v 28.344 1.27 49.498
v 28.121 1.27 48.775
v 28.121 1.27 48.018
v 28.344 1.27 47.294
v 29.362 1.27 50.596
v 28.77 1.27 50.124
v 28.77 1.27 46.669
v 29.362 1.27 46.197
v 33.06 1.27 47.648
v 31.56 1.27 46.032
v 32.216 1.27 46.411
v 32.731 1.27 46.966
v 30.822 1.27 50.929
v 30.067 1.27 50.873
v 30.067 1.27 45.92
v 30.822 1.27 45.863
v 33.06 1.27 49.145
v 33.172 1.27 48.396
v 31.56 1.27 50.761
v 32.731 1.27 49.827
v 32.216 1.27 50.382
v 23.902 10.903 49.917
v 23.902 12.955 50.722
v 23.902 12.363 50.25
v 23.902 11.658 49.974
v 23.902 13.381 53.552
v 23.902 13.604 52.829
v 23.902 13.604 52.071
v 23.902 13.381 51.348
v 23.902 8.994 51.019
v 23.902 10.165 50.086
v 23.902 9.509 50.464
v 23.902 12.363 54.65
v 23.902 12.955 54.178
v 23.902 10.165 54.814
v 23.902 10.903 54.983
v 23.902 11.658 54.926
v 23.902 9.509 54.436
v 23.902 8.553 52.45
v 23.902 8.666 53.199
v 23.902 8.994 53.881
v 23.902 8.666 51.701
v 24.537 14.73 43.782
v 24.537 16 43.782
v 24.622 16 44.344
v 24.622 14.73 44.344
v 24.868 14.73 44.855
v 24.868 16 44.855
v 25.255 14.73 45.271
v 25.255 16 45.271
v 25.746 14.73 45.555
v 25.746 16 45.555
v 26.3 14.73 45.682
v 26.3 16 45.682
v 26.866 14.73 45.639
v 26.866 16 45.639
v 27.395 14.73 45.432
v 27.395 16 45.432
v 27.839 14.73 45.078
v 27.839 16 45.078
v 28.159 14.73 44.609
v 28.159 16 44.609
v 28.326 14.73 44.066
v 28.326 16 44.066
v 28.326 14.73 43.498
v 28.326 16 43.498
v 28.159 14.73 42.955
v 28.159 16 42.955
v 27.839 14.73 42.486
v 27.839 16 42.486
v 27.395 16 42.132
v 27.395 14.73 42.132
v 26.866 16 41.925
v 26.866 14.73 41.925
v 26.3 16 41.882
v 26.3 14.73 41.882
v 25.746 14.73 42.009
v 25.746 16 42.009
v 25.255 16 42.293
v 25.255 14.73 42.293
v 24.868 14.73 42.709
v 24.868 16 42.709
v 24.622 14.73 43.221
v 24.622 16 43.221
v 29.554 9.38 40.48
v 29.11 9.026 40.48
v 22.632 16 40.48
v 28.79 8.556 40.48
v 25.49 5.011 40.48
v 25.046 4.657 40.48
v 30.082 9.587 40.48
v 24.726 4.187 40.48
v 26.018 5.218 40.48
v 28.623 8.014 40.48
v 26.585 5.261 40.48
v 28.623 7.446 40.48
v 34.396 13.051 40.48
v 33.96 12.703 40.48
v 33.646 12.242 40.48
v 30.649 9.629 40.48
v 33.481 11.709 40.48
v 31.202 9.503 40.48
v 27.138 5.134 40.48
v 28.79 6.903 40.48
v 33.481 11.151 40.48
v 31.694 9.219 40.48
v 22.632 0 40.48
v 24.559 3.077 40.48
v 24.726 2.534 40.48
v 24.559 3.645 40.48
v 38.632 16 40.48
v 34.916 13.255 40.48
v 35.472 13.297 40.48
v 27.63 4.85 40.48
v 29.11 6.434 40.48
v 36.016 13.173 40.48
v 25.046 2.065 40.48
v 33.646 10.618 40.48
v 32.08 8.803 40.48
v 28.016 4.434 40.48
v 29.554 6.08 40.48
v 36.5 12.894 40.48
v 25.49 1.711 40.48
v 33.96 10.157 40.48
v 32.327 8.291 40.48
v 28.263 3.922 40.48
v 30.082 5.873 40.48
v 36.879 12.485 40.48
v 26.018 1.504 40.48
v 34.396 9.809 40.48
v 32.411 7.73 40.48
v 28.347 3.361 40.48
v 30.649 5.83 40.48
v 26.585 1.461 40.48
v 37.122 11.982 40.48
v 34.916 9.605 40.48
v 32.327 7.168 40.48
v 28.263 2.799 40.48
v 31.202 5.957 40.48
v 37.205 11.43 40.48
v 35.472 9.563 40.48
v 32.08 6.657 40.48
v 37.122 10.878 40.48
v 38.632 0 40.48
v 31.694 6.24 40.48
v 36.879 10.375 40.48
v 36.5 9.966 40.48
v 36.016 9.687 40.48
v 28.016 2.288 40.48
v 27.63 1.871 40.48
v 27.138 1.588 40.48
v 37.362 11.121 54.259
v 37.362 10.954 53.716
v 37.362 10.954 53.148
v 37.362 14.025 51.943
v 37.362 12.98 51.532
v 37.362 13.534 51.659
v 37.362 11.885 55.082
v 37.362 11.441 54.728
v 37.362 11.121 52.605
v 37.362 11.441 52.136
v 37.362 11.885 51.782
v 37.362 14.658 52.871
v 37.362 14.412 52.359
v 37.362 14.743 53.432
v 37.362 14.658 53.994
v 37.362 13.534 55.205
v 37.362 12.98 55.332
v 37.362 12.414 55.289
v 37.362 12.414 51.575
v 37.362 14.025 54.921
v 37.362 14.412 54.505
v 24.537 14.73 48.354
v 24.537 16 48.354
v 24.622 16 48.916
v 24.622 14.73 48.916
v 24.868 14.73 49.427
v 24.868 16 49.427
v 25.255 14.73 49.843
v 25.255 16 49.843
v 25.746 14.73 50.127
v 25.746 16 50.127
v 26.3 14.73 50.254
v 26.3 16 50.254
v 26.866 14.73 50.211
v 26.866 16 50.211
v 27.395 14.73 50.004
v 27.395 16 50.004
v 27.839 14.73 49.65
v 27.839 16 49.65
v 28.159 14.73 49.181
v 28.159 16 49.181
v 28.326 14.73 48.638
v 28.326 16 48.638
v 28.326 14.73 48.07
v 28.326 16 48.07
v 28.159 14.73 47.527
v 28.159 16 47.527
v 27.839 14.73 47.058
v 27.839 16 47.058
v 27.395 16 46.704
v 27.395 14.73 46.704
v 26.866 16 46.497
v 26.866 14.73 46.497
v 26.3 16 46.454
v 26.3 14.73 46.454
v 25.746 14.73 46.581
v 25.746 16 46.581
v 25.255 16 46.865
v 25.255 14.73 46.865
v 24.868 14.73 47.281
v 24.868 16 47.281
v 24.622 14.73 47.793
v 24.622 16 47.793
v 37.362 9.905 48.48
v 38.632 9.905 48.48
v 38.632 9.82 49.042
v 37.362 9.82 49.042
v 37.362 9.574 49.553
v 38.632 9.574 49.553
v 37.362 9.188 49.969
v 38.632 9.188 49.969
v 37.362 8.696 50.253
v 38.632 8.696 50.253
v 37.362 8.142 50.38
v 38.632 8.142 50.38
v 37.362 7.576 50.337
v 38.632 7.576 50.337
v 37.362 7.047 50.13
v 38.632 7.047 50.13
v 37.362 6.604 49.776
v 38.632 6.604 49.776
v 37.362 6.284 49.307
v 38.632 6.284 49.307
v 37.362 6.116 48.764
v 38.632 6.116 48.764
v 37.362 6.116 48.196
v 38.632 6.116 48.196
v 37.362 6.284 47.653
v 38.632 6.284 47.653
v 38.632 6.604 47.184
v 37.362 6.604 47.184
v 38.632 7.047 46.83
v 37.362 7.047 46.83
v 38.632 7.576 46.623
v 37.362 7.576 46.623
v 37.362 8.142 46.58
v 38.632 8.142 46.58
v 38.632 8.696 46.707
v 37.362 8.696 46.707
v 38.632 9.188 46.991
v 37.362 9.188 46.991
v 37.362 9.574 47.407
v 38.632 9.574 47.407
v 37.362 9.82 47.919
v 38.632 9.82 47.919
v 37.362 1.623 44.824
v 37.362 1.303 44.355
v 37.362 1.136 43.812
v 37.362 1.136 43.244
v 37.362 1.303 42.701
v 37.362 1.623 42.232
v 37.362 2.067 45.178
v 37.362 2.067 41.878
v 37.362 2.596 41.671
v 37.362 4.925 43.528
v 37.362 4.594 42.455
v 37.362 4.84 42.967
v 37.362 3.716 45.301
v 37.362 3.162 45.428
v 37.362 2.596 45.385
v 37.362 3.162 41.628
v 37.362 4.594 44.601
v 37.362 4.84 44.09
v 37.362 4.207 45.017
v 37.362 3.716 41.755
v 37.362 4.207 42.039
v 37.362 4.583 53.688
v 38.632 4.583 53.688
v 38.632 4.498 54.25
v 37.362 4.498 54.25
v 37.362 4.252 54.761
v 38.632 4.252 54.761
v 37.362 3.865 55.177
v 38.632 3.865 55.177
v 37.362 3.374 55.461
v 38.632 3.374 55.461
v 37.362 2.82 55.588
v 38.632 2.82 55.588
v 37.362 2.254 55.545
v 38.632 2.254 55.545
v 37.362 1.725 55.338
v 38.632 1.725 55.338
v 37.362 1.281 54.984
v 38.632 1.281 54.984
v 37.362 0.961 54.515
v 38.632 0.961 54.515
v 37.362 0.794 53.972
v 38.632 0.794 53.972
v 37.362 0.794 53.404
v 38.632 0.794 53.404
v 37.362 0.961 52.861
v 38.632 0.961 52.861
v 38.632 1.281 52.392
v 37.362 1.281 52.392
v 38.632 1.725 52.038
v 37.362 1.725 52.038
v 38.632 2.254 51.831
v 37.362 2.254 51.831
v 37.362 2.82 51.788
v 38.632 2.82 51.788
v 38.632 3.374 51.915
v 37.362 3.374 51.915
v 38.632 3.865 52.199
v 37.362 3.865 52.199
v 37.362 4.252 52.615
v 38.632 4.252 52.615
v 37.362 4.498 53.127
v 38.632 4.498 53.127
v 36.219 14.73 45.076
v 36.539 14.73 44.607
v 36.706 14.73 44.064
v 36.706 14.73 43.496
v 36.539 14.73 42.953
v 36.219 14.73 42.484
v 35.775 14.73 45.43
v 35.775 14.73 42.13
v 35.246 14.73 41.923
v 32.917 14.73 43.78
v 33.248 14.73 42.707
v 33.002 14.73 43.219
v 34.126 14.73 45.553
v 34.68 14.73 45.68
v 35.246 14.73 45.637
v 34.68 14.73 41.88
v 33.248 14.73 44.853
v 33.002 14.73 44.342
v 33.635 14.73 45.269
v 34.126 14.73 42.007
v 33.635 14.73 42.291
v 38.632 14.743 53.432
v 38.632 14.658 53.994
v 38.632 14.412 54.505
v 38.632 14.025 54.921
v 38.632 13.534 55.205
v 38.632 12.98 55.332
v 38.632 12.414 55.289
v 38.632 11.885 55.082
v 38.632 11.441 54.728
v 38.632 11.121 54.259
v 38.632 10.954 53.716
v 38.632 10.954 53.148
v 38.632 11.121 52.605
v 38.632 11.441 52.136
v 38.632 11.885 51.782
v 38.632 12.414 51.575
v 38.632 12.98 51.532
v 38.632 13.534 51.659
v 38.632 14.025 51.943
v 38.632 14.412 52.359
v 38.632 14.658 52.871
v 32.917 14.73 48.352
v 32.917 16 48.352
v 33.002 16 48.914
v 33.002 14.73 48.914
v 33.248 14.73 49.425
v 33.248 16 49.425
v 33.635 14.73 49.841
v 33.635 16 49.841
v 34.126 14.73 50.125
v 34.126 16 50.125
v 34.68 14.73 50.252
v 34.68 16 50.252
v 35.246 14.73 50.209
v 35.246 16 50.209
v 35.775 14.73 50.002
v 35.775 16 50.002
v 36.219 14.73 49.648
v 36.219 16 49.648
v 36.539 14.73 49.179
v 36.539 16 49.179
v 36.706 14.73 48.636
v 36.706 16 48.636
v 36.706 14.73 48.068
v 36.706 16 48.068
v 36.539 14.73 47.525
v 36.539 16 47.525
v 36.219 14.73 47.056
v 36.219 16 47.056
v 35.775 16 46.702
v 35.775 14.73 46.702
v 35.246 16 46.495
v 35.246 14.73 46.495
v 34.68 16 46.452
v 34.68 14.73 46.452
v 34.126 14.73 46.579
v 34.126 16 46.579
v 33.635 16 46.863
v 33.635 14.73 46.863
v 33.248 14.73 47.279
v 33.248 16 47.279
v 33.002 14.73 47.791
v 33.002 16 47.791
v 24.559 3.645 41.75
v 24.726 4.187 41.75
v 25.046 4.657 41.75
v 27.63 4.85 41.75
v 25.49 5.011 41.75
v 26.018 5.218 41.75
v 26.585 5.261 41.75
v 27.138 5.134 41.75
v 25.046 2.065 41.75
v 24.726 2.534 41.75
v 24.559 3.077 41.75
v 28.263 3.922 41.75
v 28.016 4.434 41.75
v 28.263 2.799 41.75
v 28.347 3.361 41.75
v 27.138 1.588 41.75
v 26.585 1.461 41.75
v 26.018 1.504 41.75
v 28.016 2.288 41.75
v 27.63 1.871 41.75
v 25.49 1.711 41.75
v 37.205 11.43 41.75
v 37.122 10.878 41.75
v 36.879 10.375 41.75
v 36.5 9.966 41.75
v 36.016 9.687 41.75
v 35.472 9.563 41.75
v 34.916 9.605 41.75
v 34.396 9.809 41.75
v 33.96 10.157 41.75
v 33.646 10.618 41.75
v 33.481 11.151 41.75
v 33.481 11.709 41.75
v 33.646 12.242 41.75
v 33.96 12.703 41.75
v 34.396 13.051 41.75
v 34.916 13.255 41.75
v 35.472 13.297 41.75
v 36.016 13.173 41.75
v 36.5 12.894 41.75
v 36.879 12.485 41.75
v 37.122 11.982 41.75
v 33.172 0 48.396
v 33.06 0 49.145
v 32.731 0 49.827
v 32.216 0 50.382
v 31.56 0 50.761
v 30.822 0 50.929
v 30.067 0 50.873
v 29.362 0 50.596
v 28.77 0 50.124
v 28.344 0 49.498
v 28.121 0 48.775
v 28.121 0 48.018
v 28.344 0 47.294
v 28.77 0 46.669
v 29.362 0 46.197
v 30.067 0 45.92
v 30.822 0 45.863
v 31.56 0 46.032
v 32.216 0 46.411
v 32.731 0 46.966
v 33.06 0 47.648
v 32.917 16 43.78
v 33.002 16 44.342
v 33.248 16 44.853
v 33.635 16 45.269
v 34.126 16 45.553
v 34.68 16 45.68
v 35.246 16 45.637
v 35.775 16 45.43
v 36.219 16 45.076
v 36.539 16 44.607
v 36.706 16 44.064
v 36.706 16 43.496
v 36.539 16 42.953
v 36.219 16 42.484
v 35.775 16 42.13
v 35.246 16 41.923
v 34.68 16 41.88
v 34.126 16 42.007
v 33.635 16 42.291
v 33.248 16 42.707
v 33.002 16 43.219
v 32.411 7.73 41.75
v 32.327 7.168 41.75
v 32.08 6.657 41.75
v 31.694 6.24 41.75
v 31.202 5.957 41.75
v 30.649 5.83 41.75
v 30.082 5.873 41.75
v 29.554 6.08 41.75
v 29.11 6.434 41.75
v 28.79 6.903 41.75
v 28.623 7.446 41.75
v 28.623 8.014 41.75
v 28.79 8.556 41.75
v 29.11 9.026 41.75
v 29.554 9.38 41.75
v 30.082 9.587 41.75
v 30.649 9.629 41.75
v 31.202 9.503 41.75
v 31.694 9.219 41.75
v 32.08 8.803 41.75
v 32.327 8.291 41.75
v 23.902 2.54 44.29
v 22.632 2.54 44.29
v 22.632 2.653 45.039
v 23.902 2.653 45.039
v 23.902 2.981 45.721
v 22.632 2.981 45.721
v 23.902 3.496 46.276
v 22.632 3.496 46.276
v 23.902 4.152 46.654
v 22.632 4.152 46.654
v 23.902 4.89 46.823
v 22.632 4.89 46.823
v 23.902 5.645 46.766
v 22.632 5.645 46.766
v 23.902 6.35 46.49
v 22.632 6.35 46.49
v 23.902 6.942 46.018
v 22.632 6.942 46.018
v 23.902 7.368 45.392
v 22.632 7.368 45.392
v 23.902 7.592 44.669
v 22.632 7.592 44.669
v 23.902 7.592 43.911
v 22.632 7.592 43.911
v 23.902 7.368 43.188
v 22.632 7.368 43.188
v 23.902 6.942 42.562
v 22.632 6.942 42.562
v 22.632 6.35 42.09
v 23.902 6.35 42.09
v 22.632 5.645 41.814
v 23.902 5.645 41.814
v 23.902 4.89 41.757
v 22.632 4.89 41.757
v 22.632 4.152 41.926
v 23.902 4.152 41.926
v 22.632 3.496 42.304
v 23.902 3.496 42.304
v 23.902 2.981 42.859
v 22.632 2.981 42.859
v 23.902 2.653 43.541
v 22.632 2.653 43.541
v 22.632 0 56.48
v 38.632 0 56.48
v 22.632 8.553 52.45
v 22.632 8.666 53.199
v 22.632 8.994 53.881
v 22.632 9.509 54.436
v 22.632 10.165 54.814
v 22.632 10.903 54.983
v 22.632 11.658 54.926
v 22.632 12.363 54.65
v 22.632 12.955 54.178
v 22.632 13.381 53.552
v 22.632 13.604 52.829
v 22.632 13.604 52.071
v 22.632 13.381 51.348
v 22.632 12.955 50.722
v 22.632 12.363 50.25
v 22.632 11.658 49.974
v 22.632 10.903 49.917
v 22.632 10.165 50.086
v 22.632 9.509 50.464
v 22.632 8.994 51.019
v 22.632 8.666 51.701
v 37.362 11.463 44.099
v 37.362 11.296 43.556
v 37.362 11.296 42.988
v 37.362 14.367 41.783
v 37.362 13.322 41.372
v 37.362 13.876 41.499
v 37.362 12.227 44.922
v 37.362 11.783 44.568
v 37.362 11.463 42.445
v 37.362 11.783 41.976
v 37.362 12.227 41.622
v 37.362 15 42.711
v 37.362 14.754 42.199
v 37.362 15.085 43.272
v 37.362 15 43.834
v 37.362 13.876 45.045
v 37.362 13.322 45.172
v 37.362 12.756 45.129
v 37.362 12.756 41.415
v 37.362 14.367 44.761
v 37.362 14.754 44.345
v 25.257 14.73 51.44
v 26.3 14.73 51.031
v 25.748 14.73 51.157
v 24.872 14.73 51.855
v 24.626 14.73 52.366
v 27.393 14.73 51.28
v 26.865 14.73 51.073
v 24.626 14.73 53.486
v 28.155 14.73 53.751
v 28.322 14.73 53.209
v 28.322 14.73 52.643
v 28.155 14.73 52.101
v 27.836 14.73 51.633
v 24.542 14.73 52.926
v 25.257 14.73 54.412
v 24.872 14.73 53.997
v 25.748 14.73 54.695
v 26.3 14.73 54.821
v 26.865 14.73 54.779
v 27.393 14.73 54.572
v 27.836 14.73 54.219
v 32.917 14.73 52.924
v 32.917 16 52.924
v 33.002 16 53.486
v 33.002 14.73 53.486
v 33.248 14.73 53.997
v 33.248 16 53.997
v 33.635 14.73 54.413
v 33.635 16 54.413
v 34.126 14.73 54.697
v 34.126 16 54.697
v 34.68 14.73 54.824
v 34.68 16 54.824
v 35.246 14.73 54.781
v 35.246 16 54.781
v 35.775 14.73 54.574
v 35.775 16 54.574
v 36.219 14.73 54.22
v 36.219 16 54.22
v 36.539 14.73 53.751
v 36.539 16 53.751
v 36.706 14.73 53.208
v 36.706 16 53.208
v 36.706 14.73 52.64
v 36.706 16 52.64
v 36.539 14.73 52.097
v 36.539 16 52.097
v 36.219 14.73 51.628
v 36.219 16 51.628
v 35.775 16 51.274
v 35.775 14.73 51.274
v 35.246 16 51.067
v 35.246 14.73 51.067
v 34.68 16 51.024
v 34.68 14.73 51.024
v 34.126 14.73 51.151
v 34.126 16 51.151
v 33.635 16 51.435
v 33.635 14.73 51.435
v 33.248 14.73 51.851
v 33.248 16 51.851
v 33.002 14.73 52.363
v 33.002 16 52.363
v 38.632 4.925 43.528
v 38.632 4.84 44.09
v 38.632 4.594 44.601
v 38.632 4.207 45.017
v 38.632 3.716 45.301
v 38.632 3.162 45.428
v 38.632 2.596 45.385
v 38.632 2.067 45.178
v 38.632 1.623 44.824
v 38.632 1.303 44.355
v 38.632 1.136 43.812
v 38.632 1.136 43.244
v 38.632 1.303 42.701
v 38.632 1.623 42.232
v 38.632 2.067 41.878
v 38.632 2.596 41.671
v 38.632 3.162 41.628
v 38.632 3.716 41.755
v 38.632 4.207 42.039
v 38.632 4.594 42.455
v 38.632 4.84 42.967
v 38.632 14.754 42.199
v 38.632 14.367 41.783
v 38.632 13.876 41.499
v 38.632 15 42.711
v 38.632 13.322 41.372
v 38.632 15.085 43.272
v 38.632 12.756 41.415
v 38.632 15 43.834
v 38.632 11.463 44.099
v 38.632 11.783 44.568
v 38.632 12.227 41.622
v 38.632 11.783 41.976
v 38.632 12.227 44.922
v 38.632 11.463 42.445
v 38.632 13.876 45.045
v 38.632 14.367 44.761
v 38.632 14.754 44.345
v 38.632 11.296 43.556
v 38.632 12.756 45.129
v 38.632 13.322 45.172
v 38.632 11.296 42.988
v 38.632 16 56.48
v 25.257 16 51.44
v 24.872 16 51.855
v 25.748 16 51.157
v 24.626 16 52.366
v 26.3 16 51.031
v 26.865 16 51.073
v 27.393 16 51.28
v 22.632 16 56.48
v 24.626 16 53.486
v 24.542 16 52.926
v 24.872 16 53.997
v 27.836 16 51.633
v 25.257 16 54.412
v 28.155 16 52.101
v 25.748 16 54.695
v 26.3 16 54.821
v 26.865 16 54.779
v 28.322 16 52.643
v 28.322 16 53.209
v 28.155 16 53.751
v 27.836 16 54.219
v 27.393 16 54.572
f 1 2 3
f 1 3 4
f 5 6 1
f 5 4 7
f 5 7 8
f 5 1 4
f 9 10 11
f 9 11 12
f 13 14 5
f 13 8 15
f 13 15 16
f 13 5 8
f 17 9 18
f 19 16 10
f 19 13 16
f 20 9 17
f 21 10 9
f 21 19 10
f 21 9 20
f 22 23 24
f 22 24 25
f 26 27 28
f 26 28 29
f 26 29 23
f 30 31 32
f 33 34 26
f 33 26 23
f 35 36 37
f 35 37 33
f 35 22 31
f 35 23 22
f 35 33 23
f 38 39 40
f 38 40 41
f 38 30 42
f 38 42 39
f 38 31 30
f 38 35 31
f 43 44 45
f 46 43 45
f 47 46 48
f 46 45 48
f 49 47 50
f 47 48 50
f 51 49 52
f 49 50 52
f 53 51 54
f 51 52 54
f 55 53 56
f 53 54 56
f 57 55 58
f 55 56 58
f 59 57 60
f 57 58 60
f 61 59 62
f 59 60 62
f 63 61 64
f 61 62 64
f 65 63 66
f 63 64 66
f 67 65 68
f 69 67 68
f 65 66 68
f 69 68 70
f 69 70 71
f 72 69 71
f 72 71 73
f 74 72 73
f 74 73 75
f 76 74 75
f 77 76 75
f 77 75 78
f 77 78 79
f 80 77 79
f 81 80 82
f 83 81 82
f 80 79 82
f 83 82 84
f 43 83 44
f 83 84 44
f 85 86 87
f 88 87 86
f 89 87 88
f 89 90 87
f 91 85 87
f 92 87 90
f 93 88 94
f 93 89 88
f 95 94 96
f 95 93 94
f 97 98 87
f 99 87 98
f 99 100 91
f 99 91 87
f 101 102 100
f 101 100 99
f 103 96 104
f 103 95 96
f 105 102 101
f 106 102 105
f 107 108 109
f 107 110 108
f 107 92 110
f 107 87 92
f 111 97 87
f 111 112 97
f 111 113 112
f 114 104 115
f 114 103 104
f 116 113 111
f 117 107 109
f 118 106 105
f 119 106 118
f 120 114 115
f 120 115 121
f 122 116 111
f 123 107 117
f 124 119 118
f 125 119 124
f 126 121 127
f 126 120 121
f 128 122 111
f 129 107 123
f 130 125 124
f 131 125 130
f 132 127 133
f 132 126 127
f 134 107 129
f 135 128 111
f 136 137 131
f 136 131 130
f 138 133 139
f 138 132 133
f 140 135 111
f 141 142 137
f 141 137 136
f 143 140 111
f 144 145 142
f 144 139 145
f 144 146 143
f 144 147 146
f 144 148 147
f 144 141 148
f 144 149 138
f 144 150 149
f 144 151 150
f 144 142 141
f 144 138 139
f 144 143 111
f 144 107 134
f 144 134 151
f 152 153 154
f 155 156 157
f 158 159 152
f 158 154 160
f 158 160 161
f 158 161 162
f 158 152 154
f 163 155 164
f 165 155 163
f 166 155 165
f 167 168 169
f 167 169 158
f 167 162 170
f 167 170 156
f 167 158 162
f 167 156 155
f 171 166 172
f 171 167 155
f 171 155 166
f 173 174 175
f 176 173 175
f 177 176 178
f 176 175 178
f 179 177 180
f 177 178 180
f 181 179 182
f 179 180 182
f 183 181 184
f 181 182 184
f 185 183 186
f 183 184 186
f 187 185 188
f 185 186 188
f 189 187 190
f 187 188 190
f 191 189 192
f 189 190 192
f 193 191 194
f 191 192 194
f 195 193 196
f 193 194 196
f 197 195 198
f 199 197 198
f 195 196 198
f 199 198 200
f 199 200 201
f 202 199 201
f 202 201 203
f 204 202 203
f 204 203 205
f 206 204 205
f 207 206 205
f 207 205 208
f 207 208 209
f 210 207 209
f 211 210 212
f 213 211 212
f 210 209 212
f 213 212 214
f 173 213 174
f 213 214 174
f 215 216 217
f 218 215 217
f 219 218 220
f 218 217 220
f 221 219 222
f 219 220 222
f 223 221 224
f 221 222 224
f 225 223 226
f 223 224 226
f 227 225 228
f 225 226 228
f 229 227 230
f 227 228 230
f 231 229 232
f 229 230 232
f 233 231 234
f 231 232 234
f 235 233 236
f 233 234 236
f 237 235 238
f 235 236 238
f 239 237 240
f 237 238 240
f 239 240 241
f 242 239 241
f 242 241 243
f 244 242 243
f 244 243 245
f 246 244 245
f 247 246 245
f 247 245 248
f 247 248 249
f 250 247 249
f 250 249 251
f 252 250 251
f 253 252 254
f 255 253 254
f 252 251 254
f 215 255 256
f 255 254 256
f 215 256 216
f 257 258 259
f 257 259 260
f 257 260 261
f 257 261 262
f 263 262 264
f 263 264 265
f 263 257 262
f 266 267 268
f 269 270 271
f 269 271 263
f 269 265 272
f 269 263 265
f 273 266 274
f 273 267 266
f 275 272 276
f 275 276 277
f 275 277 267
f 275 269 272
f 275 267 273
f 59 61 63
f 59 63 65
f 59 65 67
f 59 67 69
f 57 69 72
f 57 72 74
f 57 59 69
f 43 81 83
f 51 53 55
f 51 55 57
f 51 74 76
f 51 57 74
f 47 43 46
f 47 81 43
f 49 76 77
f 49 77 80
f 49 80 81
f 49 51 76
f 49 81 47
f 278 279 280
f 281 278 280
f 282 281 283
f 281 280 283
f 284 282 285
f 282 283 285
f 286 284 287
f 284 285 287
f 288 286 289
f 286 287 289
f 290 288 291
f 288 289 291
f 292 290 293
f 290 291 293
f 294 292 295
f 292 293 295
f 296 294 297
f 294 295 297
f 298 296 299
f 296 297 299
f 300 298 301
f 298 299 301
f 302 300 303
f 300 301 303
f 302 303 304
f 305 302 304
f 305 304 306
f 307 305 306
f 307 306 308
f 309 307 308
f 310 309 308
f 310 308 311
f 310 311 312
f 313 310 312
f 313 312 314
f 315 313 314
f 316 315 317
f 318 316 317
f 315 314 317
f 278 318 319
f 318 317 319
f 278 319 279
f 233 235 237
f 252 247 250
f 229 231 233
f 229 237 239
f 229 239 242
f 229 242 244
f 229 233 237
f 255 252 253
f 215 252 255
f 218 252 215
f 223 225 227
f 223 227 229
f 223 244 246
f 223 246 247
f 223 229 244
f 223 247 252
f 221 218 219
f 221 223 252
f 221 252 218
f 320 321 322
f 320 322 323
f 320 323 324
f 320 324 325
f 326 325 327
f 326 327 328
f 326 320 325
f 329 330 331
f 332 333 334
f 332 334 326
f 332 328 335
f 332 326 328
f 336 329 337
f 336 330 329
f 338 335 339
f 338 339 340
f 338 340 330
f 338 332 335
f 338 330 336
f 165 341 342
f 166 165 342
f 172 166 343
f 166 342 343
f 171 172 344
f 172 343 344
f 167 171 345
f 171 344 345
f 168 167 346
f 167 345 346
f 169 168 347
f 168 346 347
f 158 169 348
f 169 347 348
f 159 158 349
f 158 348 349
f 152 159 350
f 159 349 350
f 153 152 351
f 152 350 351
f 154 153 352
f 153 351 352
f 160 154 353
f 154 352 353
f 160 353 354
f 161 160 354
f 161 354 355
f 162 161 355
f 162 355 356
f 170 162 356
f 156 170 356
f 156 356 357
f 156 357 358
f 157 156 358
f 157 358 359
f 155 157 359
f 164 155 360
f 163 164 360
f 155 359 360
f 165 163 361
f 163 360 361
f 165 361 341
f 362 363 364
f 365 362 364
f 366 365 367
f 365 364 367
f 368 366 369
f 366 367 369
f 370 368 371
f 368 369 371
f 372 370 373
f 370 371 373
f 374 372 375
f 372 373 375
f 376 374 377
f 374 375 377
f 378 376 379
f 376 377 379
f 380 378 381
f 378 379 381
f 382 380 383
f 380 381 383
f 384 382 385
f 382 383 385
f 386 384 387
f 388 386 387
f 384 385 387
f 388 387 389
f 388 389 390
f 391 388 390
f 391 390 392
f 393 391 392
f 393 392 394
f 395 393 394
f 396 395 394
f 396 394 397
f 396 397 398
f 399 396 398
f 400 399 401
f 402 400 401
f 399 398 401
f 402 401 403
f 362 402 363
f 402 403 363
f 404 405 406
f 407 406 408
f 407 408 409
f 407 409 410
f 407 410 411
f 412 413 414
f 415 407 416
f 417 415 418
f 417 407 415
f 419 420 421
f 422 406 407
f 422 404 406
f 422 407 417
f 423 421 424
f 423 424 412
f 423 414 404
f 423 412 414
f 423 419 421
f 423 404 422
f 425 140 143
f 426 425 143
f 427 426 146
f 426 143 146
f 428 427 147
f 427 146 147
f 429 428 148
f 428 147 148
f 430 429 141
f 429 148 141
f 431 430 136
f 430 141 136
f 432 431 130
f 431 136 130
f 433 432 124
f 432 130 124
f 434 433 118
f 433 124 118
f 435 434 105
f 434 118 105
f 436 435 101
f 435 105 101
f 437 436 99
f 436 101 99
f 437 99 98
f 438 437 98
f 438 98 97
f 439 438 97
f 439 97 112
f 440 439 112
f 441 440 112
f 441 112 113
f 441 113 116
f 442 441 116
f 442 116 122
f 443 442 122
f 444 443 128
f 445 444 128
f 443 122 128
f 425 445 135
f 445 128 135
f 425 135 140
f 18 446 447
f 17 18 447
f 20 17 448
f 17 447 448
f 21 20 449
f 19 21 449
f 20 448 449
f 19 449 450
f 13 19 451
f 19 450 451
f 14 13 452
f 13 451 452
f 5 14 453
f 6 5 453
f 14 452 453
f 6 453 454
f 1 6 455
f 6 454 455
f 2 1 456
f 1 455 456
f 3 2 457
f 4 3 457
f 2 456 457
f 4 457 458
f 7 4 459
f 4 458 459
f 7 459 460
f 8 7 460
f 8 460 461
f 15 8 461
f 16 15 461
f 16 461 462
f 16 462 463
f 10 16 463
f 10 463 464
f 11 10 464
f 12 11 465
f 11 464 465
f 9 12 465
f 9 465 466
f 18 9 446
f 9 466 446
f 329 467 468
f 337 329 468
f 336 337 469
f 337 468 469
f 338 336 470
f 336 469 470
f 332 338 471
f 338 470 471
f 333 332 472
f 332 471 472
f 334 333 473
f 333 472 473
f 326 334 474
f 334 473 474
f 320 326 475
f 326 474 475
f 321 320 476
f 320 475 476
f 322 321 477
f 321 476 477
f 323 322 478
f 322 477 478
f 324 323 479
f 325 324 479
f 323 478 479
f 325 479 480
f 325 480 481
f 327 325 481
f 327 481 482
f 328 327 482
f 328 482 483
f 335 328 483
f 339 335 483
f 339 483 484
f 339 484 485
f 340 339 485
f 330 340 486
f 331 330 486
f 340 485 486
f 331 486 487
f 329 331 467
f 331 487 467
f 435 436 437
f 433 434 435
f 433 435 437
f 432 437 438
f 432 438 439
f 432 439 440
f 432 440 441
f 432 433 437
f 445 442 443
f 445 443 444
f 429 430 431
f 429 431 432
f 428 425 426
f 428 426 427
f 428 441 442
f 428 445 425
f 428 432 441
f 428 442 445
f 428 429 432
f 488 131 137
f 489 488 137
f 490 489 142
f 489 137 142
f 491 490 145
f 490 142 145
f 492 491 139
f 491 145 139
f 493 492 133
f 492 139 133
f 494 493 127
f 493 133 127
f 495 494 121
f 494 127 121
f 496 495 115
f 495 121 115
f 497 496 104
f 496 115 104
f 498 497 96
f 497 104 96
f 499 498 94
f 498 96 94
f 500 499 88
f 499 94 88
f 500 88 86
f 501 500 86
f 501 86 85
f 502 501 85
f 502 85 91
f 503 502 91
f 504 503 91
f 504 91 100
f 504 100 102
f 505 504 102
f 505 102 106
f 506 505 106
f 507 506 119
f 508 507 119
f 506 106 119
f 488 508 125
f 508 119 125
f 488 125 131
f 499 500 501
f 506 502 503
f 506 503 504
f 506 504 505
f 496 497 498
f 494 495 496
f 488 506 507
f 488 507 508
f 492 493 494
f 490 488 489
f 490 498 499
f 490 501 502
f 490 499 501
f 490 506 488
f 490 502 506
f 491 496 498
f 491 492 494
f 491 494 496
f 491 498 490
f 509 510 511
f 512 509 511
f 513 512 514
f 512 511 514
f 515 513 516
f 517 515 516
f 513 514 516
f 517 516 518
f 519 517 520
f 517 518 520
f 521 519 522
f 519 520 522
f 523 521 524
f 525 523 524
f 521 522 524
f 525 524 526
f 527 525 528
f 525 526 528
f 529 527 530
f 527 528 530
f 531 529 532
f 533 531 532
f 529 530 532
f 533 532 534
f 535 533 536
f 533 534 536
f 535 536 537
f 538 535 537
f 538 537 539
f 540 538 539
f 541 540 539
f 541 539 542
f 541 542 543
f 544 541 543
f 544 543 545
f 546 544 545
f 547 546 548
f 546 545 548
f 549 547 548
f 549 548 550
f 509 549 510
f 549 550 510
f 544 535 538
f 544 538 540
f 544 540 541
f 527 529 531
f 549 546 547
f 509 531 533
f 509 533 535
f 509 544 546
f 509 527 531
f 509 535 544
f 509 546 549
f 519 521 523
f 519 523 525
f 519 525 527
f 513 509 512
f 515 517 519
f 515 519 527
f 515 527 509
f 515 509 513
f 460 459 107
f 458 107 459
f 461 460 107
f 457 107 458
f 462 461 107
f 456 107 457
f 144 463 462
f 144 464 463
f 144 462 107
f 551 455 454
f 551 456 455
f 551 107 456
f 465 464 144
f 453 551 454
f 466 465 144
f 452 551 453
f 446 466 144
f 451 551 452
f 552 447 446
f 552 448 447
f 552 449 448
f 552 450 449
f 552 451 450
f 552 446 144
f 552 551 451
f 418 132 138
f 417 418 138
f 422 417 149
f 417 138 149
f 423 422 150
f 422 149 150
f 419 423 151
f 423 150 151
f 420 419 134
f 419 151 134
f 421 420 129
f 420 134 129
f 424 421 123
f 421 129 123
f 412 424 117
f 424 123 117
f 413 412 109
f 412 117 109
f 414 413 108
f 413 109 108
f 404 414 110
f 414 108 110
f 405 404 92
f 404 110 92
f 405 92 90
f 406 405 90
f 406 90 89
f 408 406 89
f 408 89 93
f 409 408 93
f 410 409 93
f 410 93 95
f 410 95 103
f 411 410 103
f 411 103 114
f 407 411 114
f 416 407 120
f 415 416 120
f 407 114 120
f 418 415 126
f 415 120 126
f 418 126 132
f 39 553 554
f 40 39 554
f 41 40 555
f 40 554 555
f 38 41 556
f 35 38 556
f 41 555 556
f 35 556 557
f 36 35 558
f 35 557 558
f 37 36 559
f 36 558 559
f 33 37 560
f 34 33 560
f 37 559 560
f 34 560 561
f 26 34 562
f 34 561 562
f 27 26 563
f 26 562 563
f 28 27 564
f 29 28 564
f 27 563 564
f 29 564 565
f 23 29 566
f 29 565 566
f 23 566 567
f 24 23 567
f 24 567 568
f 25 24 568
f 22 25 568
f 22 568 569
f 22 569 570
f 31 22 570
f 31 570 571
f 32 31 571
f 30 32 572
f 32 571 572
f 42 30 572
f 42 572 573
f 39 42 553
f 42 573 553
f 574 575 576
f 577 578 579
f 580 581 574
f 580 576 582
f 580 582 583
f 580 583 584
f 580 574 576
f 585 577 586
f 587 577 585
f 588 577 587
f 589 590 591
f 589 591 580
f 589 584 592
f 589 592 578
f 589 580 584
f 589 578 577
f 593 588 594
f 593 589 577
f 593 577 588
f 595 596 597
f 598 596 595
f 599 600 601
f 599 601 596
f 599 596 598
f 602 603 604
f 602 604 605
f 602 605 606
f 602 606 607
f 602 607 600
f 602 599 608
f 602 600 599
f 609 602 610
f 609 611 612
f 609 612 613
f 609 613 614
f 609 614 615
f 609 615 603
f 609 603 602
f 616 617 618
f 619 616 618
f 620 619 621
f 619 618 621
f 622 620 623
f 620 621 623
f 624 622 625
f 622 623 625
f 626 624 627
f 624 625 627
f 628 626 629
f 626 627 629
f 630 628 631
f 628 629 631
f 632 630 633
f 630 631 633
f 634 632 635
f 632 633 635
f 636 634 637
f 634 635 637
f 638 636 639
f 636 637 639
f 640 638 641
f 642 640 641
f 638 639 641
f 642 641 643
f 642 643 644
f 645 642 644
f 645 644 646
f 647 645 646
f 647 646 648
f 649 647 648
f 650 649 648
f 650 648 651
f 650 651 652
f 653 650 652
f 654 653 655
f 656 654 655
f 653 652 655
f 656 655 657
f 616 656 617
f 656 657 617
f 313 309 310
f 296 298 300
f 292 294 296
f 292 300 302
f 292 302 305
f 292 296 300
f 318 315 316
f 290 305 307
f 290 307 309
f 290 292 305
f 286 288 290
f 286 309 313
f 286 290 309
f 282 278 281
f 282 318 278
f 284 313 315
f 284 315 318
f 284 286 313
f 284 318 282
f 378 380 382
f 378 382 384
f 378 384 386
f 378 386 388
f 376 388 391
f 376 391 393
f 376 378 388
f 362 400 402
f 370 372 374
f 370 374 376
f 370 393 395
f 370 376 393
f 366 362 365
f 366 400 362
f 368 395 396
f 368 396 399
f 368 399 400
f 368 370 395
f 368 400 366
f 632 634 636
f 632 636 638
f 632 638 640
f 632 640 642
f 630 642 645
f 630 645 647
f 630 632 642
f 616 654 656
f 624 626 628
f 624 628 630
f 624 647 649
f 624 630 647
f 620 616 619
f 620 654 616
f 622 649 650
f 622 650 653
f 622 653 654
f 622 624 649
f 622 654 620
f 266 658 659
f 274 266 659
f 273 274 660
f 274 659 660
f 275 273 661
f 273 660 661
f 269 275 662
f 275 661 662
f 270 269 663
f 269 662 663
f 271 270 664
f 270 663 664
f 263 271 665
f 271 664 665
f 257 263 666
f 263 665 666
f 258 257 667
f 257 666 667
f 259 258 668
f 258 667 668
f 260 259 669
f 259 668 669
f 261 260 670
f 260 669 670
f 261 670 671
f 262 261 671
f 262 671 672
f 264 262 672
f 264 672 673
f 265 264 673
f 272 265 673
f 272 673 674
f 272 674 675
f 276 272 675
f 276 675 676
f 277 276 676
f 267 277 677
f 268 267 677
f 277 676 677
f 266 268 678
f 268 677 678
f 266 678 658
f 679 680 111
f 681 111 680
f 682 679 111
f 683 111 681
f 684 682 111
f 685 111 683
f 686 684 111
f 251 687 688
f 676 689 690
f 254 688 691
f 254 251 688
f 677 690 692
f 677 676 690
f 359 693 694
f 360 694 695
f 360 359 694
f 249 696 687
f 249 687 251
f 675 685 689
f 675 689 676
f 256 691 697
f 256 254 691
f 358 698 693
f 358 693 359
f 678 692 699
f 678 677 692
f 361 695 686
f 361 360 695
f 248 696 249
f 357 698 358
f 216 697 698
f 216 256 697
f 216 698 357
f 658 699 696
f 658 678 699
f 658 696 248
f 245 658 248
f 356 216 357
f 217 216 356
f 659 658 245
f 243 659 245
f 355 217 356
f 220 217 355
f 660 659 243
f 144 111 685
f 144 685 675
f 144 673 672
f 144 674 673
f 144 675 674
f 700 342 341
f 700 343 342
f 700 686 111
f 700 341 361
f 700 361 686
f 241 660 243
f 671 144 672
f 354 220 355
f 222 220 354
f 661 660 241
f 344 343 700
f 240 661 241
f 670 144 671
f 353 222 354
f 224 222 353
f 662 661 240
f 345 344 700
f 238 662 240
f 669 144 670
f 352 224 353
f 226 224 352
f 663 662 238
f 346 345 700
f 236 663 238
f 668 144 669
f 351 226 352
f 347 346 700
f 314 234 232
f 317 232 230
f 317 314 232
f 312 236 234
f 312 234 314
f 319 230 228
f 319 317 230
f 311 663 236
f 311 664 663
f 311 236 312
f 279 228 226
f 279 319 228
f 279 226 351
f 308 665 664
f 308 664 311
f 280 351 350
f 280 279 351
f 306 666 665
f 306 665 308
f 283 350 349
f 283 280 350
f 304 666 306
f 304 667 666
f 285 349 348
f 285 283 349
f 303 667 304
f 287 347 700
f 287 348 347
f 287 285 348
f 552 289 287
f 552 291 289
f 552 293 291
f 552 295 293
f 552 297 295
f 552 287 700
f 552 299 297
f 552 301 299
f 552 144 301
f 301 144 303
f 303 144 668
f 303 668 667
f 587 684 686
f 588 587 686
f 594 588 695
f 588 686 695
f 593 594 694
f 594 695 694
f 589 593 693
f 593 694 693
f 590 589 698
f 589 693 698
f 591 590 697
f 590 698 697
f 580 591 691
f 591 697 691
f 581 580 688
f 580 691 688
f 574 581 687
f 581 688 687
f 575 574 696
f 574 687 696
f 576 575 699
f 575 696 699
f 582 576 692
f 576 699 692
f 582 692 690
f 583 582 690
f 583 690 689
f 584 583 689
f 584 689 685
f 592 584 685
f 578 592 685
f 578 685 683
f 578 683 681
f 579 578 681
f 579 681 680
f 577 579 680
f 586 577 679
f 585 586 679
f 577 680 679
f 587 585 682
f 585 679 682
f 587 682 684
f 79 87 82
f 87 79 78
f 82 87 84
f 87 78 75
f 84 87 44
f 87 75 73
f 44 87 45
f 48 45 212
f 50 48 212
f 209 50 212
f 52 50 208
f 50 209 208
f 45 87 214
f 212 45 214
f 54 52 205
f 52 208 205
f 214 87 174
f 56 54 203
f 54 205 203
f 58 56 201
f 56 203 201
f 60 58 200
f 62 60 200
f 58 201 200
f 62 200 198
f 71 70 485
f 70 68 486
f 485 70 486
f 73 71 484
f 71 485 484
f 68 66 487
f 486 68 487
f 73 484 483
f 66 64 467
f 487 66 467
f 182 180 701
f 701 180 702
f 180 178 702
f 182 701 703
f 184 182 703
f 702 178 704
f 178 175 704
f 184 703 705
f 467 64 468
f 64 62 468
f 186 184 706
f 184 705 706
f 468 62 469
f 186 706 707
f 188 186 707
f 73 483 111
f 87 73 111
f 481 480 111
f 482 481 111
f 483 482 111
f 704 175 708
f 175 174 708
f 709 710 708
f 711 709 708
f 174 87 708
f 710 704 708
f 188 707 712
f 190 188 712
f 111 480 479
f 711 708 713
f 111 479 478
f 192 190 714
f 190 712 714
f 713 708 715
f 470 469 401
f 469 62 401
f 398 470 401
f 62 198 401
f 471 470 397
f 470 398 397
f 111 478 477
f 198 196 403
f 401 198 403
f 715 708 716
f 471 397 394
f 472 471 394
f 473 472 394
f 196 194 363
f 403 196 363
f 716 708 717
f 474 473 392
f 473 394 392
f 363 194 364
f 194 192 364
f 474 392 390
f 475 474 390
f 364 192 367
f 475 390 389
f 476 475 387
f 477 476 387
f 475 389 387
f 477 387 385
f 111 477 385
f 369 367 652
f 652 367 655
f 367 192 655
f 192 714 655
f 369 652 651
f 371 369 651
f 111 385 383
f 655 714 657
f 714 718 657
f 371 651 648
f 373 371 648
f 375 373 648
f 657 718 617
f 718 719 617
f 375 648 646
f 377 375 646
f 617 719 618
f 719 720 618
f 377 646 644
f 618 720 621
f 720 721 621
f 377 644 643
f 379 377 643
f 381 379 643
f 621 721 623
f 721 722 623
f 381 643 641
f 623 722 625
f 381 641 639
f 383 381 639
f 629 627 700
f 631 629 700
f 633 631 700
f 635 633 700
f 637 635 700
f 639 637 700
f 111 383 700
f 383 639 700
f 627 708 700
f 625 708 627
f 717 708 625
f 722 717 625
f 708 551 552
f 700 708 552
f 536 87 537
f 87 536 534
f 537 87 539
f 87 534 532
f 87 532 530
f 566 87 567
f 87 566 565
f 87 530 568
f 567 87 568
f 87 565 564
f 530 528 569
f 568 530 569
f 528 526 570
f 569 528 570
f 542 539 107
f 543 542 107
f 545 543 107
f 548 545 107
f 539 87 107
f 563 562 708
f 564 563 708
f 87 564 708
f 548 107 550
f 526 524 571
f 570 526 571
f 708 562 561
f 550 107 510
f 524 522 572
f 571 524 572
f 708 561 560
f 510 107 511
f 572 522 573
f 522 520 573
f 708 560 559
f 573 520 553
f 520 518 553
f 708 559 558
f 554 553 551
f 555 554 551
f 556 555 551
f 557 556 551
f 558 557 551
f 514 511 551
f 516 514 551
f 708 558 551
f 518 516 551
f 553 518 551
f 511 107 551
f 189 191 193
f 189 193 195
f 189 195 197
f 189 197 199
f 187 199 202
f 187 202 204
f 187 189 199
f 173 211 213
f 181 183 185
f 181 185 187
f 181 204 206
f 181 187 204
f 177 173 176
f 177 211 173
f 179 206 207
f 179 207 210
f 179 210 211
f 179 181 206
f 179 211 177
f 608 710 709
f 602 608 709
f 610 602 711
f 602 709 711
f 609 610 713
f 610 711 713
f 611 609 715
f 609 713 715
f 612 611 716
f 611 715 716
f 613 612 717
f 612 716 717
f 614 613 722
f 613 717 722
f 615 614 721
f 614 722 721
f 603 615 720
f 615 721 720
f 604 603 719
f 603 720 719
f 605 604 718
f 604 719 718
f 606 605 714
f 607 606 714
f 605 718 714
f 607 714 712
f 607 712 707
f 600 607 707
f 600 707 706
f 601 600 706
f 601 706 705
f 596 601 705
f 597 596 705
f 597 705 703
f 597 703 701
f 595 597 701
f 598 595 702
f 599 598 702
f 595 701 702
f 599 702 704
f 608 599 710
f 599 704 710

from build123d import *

# Parameters (mm, degrees)
F0_W      = 16
F0_H      = 16
F1_DEPTH  = 16
F2_R      = 2.54
F2_R_2    = 0.083649
F3_DEPTH  = 1.27
F3_FACE_R = 0.083649
F4_DEPTH  = 1.27
F5_R      = 2.54
F6_DEPTH  = 1.27
F7_DEPTH  = 1.27
F8_R      = 1.905
F8_R_2    = 1.900447
F9_DEPTH  = 1.27
F10_R     = 1.905
F11_DEPTH = 1.27
F12_R     = 1.872316
F12_R_2   = 1.905
F14_DEPTH = 1.27


with BuildPart() as f1:
    # F0 (on Front) → F1 (new body)
    with BuildSketch(Plane.XZ):
        with Locations((30.6324, 48.480009)):
            Rectangle(F0_W, F0_H)
    extrude(amount=-F1_DEPTH)

    # F2 (on face) → F3 (cut)
    with BuildSketch(Plane.XZ):
        with Locations((30.6324, 48.39636)):
            Circle(F2_R)
        with Locations((30.6324, 48.39636)):
            Circle(F2_R_2, mode=Mode.SUBTRACT)
    extrude(amount=-F3_DEPTH, mode=Mode.SUBTRACT)

    # F3_face (on face) → F4 (cut)
    with BuildSketch(Plane(origin=(30.6324, 0, 48.39636), x_dir=(1, 0, 0), z_dir=(0, -1, 0))):
        Circle(F3_FACE_R)
    extrude(amount=-F4_DEPTH, mode=Mode.SUBTRACT)

    # F5 (on face) → F6 (cut)
    with BuildSketch(Plane(origin=(22.6324, 0, 0), x_dir=(0, -1, 0), z_dir=(-1, 0, 0))):
        with Locations((-11.092744, 52.449955)):
            Circle(F5_R)
    extrude(amount=-F6_DEPTH, mode=Mode.SUBTRACT)

    # F5 (on face) → F7 (cut)
    with BuildSketch(Plane(origin=(22.6324, 0, 0), x_dir=(0, -1, 0), z_dir=(-1, 0, 0))):
        with Locations((-11.092744, 52.449955)):
            Circle(F5_R)
        with Locations((-5.08, 44.290009)):
            Circle(F5_R)
    extrude(amount=-F7_DEPTH, mode=Mode.SUBTRACT)

    # F8 (on face) → F9 (cut)
    with BuildSketch(Plane(origin=(0, 16, 0), x_dir=(-1, 0, 0), z_dir=(0, 1, 0))):
        with Locations((-34.8224, 52.924009)):
            Circle(F8_R)
        with Locations((-34.8224, 48.352009)):
            Circle(F8_R)
        with Locations((-34.8224, 43.780009)):
            Circle(F8_R)
        with Locations((-26.4424, 52.926009)):
            Circle(F8_R_2)
        with Locations((-26.4424, 43.782009)):
            Circle(F8_R)
        with Locations((-26.4424, 48.354009)):
            Circle(F8_R)
    extrude(amount=-F9_DEPTH, mode=Mode.SUBTRACT)

    # F10 (on face) → F11 (cut)
    with BuildSketch(Plane.YZ.offset(38.6324)):
        with Locations((8, 48.480009)):
            Circle(F10_R)
        with Locations((2.677711, 53.688009)):
            Circle(F10_R)
        with Locations((12.837711, 53.432009)):
            Circle(F10_R)
        with Locations((13.179603, 43.272009)):
            Circle(F10_R)
        with Locations((3.019603, 43.528009)):
            Circle(F10_R)
    extrude(amount=-F11_DEPTH, mode=Mode.SUBTRACT)

    # F12 (on face) → F14 (cut)
    with BuildSketch(Plane(origin=(0, 0, 40.480009), x_dir=(1, 0, 0), z_dir=(0, 0, -1))):
        with Locations((35.3324, -11.43)):
            Circle(F12_R)
        with Locations((30.5064, -7.72982)):
            Circle(F12_R_2)
        with Locations((26.4424, -3.360859)):
            Circle(F12_R_2)
    extrude(amount=-F14_DEPTH, mode=Mode.SUBTRACT)


solid = f1.part
